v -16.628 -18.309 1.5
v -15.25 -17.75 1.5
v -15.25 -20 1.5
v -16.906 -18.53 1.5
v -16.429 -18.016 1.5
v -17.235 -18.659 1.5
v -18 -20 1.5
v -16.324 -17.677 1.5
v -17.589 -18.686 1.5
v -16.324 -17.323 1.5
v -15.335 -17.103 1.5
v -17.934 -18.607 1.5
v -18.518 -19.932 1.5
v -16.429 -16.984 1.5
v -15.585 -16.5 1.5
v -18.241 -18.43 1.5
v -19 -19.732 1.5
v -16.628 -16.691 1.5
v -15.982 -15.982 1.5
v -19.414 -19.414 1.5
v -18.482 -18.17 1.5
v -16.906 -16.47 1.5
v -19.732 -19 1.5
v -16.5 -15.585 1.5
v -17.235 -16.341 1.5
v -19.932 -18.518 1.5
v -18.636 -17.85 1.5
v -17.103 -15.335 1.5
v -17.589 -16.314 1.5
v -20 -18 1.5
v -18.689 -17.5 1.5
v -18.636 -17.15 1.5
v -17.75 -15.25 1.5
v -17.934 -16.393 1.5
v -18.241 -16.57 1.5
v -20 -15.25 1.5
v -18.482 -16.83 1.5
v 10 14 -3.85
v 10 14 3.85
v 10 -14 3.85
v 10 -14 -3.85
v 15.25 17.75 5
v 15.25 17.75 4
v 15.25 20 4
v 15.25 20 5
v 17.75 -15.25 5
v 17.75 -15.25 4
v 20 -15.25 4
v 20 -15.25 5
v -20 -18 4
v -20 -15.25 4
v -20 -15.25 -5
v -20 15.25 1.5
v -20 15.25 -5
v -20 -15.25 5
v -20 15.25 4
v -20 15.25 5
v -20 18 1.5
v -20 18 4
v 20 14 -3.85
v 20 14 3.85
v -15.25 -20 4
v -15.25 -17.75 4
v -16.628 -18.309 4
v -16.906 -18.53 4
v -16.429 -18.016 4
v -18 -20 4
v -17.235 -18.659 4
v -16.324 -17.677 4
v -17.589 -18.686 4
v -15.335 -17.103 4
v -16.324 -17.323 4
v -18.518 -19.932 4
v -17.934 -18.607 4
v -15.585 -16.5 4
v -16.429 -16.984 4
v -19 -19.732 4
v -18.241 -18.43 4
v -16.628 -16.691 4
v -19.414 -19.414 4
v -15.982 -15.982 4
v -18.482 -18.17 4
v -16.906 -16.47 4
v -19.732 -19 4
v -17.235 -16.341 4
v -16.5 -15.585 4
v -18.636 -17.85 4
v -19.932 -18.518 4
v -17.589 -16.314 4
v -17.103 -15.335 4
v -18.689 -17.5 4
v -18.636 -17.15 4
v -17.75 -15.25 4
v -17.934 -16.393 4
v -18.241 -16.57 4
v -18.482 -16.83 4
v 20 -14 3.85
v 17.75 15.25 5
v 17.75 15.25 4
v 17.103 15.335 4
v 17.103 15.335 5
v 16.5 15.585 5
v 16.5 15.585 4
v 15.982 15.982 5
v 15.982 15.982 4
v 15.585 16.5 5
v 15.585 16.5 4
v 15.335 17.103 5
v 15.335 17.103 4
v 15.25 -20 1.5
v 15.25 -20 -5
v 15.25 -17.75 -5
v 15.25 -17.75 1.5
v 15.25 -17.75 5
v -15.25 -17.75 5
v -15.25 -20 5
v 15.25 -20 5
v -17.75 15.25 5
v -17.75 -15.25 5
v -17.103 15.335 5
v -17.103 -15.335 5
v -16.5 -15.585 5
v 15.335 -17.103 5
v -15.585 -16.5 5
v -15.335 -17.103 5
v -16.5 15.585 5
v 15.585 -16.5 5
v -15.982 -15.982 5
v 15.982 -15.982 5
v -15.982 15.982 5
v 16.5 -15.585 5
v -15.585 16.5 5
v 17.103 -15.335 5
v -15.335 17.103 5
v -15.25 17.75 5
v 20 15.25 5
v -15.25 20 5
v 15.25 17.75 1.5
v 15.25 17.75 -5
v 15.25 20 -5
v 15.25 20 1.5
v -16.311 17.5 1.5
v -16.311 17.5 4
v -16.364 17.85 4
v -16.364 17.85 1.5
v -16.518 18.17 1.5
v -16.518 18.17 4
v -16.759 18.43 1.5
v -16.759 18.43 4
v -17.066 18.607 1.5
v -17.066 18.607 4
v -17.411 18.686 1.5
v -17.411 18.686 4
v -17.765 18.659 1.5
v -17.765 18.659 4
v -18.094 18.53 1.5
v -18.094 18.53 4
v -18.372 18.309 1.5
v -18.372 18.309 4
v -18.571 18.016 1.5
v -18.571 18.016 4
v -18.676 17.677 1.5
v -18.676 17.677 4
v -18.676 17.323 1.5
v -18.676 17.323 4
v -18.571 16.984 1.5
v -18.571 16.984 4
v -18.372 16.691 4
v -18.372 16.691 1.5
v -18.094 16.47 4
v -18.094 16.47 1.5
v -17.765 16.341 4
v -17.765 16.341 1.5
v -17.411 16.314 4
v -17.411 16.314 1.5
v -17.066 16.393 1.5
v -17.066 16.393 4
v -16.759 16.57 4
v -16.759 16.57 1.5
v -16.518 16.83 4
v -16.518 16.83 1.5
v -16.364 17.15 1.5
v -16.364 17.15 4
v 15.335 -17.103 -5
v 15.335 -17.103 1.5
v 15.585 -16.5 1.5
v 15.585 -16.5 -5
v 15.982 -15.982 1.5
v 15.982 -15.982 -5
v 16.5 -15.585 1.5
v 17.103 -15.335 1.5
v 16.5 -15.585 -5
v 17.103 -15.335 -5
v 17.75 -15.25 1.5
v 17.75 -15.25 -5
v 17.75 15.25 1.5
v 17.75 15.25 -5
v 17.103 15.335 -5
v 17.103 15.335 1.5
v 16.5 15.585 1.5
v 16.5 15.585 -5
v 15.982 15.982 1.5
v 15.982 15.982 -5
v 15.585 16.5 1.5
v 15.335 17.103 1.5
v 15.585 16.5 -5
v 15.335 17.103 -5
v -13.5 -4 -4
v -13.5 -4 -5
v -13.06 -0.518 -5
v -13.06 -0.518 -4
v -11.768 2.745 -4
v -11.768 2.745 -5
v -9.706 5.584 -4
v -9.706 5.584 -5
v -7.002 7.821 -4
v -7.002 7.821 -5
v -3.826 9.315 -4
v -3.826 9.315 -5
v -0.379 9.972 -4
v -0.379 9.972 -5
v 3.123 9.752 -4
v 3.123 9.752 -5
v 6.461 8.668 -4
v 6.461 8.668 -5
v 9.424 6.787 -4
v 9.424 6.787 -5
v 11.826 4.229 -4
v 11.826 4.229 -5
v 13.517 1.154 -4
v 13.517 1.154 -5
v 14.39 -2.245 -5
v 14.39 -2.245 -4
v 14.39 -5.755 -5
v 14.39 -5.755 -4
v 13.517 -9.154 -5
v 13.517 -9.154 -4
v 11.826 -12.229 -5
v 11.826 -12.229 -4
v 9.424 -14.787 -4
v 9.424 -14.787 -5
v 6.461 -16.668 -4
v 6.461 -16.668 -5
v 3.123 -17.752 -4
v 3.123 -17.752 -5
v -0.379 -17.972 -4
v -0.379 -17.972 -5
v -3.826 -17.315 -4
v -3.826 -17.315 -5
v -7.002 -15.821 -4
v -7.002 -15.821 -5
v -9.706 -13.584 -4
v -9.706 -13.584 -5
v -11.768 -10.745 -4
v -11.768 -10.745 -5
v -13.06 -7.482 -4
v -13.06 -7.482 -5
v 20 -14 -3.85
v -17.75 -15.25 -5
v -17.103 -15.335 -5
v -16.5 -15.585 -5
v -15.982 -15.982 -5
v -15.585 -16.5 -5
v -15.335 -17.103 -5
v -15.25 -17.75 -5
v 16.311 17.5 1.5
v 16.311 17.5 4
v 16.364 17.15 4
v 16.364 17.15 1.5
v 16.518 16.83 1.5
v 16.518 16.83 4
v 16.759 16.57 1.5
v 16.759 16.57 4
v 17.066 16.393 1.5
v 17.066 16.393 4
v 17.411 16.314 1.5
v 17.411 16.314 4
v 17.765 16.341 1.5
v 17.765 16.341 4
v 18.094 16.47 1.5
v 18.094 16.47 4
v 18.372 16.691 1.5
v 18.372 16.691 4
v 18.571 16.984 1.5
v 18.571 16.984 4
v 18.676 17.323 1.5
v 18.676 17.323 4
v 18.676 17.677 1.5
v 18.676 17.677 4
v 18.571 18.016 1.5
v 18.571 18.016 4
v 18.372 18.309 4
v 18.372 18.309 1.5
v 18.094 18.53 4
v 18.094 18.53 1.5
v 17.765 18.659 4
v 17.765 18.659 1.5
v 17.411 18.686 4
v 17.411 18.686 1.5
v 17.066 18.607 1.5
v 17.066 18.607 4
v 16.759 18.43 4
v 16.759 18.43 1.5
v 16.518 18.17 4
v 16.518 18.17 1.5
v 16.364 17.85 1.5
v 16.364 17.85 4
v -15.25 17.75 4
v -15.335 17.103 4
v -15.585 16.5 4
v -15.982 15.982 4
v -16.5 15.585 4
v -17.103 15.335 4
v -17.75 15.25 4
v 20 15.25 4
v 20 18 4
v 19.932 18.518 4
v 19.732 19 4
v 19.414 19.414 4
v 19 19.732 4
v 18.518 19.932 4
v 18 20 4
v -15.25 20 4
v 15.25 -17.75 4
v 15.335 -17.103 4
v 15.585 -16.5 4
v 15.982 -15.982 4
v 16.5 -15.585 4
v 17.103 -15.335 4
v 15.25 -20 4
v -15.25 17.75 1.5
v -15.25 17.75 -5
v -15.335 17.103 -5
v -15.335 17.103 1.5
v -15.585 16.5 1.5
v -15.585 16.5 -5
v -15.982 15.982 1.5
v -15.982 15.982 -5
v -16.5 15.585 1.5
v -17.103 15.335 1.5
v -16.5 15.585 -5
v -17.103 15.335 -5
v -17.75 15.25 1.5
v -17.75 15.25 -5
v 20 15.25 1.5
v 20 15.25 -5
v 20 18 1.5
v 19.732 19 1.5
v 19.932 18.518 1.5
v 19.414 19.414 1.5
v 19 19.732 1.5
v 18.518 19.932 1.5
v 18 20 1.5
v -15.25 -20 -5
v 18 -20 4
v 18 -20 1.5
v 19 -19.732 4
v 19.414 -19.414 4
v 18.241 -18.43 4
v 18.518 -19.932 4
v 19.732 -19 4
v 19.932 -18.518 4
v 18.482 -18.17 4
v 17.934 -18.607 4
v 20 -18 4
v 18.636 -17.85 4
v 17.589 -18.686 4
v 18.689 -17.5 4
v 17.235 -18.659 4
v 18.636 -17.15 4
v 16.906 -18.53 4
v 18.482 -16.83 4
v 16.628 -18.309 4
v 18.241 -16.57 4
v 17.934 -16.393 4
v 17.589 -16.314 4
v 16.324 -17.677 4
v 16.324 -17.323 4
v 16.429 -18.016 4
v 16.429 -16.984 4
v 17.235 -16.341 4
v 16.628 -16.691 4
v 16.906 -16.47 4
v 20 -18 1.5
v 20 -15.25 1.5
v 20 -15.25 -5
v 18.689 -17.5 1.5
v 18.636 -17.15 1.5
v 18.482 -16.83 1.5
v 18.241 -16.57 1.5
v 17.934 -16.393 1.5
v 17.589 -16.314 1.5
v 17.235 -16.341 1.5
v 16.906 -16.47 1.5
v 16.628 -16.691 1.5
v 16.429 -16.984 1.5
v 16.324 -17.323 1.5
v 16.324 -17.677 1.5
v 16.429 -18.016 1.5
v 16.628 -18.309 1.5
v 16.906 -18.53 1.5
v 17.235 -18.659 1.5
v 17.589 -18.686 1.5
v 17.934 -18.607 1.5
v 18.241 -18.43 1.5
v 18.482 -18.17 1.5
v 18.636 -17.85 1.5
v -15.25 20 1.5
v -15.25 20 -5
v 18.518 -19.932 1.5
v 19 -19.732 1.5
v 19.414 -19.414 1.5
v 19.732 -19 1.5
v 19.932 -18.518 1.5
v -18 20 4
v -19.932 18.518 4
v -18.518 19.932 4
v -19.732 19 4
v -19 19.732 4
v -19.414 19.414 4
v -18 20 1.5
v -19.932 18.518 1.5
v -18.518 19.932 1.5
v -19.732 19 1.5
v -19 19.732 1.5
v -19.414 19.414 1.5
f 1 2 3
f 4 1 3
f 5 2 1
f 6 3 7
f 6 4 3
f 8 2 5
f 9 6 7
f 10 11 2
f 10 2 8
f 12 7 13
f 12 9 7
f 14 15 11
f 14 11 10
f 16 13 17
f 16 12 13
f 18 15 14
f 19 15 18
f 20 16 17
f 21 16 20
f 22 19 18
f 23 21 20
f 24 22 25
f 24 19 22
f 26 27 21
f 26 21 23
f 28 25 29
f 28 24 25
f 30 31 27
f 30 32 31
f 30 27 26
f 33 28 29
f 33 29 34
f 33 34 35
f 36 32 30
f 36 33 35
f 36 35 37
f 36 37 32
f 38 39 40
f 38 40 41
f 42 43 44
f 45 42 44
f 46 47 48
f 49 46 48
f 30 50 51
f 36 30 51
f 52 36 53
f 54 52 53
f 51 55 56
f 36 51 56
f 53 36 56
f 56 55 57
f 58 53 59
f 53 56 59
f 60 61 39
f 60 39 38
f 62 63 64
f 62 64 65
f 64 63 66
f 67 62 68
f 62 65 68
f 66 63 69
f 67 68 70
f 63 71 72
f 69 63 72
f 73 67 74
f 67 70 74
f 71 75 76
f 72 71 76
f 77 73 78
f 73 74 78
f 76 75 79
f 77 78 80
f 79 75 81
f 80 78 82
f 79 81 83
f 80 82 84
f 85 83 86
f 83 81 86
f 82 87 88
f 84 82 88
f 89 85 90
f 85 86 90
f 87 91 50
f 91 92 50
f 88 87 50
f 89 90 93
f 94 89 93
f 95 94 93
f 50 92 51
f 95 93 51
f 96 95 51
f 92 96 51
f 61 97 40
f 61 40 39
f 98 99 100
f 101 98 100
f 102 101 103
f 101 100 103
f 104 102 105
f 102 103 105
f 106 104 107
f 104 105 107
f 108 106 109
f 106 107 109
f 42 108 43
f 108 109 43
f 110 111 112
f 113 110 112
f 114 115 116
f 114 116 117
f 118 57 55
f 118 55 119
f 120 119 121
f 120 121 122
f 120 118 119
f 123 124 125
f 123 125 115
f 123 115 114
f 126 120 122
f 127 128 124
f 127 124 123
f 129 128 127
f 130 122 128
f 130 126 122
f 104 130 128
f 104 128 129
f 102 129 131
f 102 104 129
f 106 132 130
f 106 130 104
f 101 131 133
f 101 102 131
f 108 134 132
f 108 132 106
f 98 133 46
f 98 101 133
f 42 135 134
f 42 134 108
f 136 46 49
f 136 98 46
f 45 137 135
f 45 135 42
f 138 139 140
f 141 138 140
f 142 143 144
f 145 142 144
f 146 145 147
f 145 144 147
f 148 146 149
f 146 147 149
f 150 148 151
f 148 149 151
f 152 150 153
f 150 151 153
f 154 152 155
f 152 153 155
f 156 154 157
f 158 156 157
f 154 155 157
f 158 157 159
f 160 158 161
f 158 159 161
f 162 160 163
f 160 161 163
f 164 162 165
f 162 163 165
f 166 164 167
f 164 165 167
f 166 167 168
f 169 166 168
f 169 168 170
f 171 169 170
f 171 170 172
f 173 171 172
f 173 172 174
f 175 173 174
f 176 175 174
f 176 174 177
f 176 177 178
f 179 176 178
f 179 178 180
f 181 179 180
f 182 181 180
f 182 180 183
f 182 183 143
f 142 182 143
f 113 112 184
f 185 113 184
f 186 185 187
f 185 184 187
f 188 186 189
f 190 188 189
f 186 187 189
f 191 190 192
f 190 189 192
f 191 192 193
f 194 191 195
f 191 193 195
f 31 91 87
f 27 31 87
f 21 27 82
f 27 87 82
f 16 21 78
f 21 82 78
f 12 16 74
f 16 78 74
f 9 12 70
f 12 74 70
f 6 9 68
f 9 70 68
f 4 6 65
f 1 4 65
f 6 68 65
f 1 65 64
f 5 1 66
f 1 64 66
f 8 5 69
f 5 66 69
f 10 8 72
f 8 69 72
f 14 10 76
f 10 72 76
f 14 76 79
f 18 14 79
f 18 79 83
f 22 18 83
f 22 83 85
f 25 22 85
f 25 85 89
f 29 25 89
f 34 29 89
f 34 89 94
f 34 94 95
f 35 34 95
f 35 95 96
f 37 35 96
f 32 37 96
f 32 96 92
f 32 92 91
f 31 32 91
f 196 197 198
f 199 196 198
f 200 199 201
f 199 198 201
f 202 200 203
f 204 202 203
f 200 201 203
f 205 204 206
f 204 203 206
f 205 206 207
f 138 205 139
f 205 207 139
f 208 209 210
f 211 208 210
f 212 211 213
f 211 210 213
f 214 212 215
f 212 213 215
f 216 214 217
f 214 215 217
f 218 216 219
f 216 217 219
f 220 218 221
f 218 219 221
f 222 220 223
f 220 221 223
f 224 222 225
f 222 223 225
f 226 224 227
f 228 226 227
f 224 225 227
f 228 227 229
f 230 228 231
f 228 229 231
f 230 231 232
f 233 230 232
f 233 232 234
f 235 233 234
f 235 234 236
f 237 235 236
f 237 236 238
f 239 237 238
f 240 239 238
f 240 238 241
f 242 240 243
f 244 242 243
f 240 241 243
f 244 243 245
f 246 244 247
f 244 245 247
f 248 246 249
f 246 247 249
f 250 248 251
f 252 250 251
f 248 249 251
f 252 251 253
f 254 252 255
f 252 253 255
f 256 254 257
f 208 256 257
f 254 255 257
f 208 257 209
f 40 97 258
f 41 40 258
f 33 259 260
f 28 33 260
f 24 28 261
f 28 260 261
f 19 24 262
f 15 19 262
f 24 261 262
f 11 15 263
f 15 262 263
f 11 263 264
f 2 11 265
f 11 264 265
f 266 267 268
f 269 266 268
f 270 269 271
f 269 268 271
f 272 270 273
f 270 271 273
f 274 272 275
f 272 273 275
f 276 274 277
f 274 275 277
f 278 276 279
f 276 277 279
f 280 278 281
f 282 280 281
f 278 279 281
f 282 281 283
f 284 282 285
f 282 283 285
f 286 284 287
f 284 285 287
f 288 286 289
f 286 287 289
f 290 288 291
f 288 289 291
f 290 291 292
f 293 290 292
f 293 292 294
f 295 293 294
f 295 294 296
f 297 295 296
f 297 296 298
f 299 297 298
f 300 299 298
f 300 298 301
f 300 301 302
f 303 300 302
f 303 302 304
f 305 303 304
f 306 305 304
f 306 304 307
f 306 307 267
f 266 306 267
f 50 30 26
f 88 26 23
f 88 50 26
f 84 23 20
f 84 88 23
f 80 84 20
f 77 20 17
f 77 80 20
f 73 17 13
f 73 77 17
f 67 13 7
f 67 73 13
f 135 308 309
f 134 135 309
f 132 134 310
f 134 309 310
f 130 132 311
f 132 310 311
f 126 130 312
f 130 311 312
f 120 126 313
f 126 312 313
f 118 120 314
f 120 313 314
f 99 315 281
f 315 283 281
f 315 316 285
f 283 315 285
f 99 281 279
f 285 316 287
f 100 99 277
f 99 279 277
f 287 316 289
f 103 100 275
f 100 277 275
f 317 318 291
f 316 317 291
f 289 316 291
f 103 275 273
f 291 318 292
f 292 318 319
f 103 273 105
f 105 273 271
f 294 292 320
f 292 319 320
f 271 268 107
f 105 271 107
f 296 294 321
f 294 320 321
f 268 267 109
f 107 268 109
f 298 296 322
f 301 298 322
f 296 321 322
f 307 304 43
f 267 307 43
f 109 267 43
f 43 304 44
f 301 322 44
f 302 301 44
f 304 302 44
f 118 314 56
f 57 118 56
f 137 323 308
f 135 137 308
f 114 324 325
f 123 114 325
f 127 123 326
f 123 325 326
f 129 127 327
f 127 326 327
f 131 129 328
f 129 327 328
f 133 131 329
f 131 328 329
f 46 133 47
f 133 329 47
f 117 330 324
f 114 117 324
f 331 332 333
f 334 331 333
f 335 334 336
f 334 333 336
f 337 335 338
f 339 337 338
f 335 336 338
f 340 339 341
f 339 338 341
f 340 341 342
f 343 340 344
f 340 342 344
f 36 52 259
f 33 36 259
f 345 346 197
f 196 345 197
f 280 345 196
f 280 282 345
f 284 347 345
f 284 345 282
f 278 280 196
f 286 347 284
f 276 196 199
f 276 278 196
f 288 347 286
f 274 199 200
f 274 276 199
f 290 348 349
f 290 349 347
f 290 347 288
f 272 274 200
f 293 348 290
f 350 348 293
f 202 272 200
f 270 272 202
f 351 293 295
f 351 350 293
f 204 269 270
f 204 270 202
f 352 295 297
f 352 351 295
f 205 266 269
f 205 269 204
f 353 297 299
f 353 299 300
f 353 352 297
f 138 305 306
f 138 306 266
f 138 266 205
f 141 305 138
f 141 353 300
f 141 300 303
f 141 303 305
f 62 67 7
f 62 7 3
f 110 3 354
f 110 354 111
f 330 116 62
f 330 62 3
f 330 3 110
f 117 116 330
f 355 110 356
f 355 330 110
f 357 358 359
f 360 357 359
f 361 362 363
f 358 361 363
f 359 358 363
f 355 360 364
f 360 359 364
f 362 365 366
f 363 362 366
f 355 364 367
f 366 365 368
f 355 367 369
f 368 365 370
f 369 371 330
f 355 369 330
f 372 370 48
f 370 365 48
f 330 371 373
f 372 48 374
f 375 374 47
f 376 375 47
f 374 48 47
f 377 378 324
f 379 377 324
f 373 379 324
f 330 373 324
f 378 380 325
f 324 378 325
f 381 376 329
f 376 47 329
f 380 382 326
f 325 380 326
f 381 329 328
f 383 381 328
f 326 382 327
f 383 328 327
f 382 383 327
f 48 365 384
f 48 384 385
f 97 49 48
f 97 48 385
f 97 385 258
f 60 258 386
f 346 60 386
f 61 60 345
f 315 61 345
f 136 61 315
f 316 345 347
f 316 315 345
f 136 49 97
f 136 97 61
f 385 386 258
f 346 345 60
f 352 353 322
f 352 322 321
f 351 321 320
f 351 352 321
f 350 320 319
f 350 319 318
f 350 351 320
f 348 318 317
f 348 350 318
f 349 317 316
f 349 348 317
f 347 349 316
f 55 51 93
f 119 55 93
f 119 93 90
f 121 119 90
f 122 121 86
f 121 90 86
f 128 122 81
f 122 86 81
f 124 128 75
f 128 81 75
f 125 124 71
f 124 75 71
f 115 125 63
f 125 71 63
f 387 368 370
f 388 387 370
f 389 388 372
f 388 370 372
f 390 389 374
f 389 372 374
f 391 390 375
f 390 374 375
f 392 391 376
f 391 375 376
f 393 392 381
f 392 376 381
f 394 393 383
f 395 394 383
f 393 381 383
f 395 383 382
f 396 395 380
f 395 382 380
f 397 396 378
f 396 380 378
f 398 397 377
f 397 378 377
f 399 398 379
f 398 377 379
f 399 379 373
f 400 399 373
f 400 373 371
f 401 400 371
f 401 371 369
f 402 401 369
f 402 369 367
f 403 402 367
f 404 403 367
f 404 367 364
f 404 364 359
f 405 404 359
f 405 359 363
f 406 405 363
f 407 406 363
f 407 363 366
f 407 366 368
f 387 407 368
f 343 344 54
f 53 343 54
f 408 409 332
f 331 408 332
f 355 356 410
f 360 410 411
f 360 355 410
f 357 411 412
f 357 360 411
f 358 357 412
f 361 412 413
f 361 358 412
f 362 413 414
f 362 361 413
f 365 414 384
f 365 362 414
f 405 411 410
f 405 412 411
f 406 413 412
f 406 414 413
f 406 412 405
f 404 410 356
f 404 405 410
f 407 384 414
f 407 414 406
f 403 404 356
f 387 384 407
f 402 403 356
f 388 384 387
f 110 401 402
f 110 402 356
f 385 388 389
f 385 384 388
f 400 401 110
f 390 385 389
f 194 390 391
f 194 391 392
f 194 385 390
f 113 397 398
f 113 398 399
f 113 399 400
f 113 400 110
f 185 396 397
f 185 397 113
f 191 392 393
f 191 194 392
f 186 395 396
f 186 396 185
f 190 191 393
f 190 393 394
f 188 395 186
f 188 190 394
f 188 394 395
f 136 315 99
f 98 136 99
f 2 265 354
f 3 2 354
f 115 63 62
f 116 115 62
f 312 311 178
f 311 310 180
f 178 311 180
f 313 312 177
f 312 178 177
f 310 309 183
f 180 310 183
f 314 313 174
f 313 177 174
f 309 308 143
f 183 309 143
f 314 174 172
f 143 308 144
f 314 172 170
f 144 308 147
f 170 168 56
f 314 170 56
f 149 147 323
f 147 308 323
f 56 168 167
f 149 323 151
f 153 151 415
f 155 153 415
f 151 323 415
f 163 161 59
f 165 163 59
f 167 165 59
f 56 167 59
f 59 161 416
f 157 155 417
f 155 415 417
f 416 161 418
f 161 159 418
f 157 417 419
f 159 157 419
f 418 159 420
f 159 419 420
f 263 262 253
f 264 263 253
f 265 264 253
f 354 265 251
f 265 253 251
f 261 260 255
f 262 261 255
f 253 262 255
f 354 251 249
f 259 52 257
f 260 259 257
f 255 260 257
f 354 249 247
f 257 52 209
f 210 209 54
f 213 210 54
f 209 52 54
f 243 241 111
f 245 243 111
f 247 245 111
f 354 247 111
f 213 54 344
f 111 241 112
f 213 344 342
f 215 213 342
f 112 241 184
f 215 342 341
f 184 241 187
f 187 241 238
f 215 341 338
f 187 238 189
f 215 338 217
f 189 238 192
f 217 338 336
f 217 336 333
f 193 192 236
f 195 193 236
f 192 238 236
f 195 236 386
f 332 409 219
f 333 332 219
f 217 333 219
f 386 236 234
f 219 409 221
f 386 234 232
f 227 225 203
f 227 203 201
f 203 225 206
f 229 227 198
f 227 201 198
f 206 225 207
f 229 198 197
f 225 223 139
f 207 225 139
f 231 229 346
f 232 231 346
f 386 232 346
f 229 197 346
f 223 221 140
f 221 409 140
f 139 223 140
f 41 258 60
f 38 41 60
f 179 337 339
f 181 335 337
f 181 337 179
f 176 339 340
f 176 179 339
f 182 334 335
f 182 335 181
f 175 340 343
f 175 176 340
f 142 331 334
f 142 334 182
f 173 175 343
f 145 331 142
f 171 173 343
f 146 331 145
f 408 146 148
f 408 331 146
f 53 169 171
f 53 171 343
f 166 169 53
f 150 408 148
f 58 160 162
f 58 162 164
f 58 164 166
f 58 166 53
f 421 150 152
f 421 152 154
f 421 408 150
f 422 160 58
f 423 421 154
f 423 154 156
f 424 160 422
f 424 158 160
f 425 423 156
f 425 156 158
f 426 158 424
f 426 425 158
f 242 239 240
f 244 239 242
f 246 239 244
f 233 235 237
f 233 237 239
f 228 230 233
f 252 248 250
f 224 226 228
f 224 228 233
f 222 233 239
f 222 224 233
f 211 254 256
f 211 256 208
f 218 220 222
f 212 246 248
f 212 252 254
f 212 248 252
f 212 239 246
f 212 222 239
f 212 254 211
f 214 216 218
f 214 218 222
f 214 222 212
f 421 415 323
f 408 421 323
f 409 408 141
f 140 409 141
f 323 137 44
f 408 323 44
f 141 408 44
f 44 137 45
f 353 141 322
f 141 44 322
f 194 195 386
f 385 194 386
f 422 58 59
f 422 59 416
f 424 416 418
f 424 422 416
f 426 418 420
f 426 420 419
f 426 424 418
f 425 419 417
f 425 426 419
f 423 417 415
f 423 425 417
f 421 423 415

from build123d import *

# Parameters (mm, degrees)
SKETCH_1_W          = 40
SKETCH_1_H          = 40
EXTRUDE_1_DEPTH     = 5
SKETCH_2_W          = 7.7
SKETCH_2_H          = 28
CUT_EXTRUDE_1_DEPTH = 10
CUT_EXTRUDE_2_DEPTH = 6.5
FILLET_1_R          = 2
CUT_EXTRUDE_START   = -1
CUT_EXTRUDE_3_DEPTH = 1
CUT_EXTRUDE_4_REACH = 31.682
SKETCH_5_R          = 1.189
SKETCH_6_R          = 14
CUT_EXTRUDE_5_DEPTH = 1


with BuildPart() as part:
    # 草图1 → 凸台-拉伸1 (new, symmetric)
    with BuildSketch(Plane.XY):
        Rectangle(SKETCH_1_W, SKETCH_1_H)
    extrude(amount=EXTRUDE_1_DEPTH, both=True)

    # 草图2 → 切除-拉伸1 (cut)
    with BuildSketch(Plane(origin=(20, 0, 0), x_dir=(0, 0, -1), z_dir=(1, 0, 0))):
        Rectangle(SKETCH_2_W, SKETCH_2_H)
    extrude(amount=-CUT_EXTRUDE_1_DEPTH, mode=Mode.SUBTRACT)

    # 草图3 → 切除-拉伸2 (cut)
    with BuildSketch(Plane(origin=(0, 0, -5), x_dir=(-1, 0, 0), z_dir=(0, 0, -1))):
        with BuildLine():
            Line((20, 20), (15.25, 20))
            Line((15.25, 20), (15.25, 17.75))
            ThreePointArc((15.25, 17.75), (15.982233047, 15.982233047), (17.75, 15.25))
            Line((17.75, 15.25), (20, 15.25))
            Line((20, 15.25), (20, 20))
        make_face()
        with BuildLine():
            Line((20, -20), (20, -15.25))
            Line((20, -15.25), (17.75, -15.25))
            ThreePointArc((17.75, -15.25), (15.982233047, -15.982233047), (15.25, -17.75))
            Line((15.25, -17.75), (15.25, -20))
            Line((15.25, -20), (20, -20))
        make_face()
        with BuildLine():
            Line((-17.75, -15.25), (-20, -15.25))
            Line((-20, -15.25), (-20, -20))
            Line((-20, -20), (-15.25, -20))
            Line((-15.25, -20), (-15.25, -17.75))
            ThreePointArc((-15.25, -17.75), (-15.982233047, -15.982233047), (-17.75, -15.25))
        make_face()
        with BuildLine():
            Line((-15.25, 17.75), (-15.25, 20))
            Line((-15.25, 20), (-20, 20))
            Line((-20, 20), (-20, 15.25))
            Line((-20, 15.25), (-17.75, 15.25))
            ThreePointArc((-17.75, 15.25), (-15.982233047, 15.982233047), (-15.25, 17.75))
        make_face()
    extrude(amount=-CUT_EXTRUDE_2_DEPTH, mode=Mode.SUBTRACT)

    # 圆角1
    fillet_1_edges = [part.edges().sort_by_distance(p)[0] for p in [
        (20, -20, 3.25),
        (-20, -20, 3.25),
        (-20, 20, 3.25),
        (20, 20, 3.25),
    ]]
    fillet(fillet_1_edges, radius=FILLET_1_R)

    # 草图4 → 切除-拉伸3 (cut)
    with BuildSketch(Plane.XY.offset(5).offset(CUT_EXTRUDE_START)):
        with BuildLine():
            Line((20, -15.25), (20, -18))
            ThreePointArc((20, -18), (19.414213562, -19.414213562), (18, -20))
            Line((18, -20), (15.25, -20))
            Line((15.25, -20), (15.25, -17.75))
            ThreePointArc((15.25, -17.75), (15.982233047, -15.982233047), (17.75, -15.25))
            Line((17.75, -15.25), (20, -15.25))
        make_face()
        with BuildLine():
            Line((-15.25, -20), (-18, -20))
            ThreePointArc((-18, -20), (-19.414213562, -19.414213562), (-20, -18))
            Line((-20, -18), (-20, -15.25))
            Line((-20, -15.25), (-17.75, -15.25))
            ThreePointArc((-17.75, -15.25), (-15.982233047, -15.982233047), (-15.25, -17.75))
            Line((-15.25, -17.75), (-15.25, -20))
        make_face()
        with BuildLine():
            Line((15.25, 20), (18, 20))
            ThreePointArc((18, 20), (19.414213562, 19.414213562), (20, 18))
            Line((20, 18), (20, 15.25))
            Line((20, 15.25), (17.75, 15.25))
            ThreePointArc((17.75, 15.25), (15.982233047, 15.982233047), (15.25, 17.75))
            Line((15.25, 17.75), (15.25, 20))
        make_face()
        with BuildLine():
            Line((-20, 15.25), (-20, 18))
            ThreePointArc((-20, 18), (-19.414213562, 19.414213562), (-18, 20))
            Line((-18, 20), (-15.25, 20))
            Line((-15.25, 20), (-15.25, 17.75))
            ThreePointArc((-15.25, 17.75), (-15.982233047, 15.982233047), (-17.75, 15.25))
            Line((-17.75, 15.25), (-20, 15.25))
        make_face()
    extrude(amount=CUT_EXTRUDE_3_DEPTH, mode=Mode.SUBTRACT)

    # 草图5 → 切除-拉伸4 (cut, up to next)
    with BuildSketch(Plane.XY.offset(4), mode=Mode.PRIVATE) as cut_extrude_4_sk1:
        with Locations((-17.5, 17.5)):
            Circle(SKETCH_5_R)
    cut_extrude_4_tool1 = extrude(cut_extrude_4_sk1.sketch, amount=-CUT_EXTRUDE_4_REACH, mode=Mode.PRIVATE) & part.part
    # 草图5 → 切除-拉伸4 (cut, up to next)
    with BuildSketch(Plane.XY.offset(4), mode=Mode.PRIVATE) as cut_extrude_4_sk2:
        with Locations(Location((-17.5, -17.5, 0), (0, 0, 180))):
            Circle(SKETCH_5_R)
    cut_extrude_4_tool2 = extrude(cut_extrude_4_sk2.sketch, amount=-CUT_EXTRUDE_4_REACH, mode=Mode.PRIVATE) & part.part
    # 草图5 → 切除-拉伸4 (cut, up to next)
    with BuildSketch(Plane.XY.offset(4), mode=Mode.PRIVATE) as cut_extrude_4_sk3:
        with Locations((17.5, -17.5)):
            Circle(SKETCH_5_R)
    cut_extrude_4_tool3 = extrude(cut_extrude_4_sk3.sketch, amount=-CUT_EXTRUDE_4_REACH, mode=Mode.PRIVATE) & part.part
    # 草图5 → 切除-拉伸4 (cut, up to next)
    with BuildSketch(Plane.XY.offset(4), mode=Mode.PRIVATE) as cut_extrude_4_sk4:
        with Locations(Location((17.5, 17.5, 0), (0, 0, 180))):
            Circle(SKETCH_5_R)
    cut_extrude_4_tool4 = extrude(cut_extrude_4_sk4.sketch, amount=-CUT_EXTRUDE_4_REACH, mode=Mode.PRIVATE) & part.part
    add(cut_extrude_4_tool1.solids().sort_by_distance((-17.5, 17.5, 4))[0], mode=Mode.SUBTRACT)
    add(cut_extrude_4_tool2.solids().sort_by_distance((-17.5, -17.5, 4))[0], mode=Mode.SUBTRACT)
    add(cut_extrude_4_tool3.solids().sort_by_distance((17.5, -17.5, 4))[0], mode=Mode.SUBTRACT)
    add(cut_extrude_4_tool4.solids().sort_by_distance((17.5, 17.5, 4))[0], mode=Mode.SUBTRACT)

    # 草图6 → 切除-拉伸5 (cut)
    with BuildSketch(Plane(origin=(0, 0, -5), x_dir=(-1, 0, 0), z_dir=(0, 0, -1))):
        with Locations((-0.5, -4)):
            Circle(SKETCH_6_R)
    extrude(amount=-CUT_EXTRUDE_5_DEPTH, mode=Mode.SUBTRACT)


solid = part.part
